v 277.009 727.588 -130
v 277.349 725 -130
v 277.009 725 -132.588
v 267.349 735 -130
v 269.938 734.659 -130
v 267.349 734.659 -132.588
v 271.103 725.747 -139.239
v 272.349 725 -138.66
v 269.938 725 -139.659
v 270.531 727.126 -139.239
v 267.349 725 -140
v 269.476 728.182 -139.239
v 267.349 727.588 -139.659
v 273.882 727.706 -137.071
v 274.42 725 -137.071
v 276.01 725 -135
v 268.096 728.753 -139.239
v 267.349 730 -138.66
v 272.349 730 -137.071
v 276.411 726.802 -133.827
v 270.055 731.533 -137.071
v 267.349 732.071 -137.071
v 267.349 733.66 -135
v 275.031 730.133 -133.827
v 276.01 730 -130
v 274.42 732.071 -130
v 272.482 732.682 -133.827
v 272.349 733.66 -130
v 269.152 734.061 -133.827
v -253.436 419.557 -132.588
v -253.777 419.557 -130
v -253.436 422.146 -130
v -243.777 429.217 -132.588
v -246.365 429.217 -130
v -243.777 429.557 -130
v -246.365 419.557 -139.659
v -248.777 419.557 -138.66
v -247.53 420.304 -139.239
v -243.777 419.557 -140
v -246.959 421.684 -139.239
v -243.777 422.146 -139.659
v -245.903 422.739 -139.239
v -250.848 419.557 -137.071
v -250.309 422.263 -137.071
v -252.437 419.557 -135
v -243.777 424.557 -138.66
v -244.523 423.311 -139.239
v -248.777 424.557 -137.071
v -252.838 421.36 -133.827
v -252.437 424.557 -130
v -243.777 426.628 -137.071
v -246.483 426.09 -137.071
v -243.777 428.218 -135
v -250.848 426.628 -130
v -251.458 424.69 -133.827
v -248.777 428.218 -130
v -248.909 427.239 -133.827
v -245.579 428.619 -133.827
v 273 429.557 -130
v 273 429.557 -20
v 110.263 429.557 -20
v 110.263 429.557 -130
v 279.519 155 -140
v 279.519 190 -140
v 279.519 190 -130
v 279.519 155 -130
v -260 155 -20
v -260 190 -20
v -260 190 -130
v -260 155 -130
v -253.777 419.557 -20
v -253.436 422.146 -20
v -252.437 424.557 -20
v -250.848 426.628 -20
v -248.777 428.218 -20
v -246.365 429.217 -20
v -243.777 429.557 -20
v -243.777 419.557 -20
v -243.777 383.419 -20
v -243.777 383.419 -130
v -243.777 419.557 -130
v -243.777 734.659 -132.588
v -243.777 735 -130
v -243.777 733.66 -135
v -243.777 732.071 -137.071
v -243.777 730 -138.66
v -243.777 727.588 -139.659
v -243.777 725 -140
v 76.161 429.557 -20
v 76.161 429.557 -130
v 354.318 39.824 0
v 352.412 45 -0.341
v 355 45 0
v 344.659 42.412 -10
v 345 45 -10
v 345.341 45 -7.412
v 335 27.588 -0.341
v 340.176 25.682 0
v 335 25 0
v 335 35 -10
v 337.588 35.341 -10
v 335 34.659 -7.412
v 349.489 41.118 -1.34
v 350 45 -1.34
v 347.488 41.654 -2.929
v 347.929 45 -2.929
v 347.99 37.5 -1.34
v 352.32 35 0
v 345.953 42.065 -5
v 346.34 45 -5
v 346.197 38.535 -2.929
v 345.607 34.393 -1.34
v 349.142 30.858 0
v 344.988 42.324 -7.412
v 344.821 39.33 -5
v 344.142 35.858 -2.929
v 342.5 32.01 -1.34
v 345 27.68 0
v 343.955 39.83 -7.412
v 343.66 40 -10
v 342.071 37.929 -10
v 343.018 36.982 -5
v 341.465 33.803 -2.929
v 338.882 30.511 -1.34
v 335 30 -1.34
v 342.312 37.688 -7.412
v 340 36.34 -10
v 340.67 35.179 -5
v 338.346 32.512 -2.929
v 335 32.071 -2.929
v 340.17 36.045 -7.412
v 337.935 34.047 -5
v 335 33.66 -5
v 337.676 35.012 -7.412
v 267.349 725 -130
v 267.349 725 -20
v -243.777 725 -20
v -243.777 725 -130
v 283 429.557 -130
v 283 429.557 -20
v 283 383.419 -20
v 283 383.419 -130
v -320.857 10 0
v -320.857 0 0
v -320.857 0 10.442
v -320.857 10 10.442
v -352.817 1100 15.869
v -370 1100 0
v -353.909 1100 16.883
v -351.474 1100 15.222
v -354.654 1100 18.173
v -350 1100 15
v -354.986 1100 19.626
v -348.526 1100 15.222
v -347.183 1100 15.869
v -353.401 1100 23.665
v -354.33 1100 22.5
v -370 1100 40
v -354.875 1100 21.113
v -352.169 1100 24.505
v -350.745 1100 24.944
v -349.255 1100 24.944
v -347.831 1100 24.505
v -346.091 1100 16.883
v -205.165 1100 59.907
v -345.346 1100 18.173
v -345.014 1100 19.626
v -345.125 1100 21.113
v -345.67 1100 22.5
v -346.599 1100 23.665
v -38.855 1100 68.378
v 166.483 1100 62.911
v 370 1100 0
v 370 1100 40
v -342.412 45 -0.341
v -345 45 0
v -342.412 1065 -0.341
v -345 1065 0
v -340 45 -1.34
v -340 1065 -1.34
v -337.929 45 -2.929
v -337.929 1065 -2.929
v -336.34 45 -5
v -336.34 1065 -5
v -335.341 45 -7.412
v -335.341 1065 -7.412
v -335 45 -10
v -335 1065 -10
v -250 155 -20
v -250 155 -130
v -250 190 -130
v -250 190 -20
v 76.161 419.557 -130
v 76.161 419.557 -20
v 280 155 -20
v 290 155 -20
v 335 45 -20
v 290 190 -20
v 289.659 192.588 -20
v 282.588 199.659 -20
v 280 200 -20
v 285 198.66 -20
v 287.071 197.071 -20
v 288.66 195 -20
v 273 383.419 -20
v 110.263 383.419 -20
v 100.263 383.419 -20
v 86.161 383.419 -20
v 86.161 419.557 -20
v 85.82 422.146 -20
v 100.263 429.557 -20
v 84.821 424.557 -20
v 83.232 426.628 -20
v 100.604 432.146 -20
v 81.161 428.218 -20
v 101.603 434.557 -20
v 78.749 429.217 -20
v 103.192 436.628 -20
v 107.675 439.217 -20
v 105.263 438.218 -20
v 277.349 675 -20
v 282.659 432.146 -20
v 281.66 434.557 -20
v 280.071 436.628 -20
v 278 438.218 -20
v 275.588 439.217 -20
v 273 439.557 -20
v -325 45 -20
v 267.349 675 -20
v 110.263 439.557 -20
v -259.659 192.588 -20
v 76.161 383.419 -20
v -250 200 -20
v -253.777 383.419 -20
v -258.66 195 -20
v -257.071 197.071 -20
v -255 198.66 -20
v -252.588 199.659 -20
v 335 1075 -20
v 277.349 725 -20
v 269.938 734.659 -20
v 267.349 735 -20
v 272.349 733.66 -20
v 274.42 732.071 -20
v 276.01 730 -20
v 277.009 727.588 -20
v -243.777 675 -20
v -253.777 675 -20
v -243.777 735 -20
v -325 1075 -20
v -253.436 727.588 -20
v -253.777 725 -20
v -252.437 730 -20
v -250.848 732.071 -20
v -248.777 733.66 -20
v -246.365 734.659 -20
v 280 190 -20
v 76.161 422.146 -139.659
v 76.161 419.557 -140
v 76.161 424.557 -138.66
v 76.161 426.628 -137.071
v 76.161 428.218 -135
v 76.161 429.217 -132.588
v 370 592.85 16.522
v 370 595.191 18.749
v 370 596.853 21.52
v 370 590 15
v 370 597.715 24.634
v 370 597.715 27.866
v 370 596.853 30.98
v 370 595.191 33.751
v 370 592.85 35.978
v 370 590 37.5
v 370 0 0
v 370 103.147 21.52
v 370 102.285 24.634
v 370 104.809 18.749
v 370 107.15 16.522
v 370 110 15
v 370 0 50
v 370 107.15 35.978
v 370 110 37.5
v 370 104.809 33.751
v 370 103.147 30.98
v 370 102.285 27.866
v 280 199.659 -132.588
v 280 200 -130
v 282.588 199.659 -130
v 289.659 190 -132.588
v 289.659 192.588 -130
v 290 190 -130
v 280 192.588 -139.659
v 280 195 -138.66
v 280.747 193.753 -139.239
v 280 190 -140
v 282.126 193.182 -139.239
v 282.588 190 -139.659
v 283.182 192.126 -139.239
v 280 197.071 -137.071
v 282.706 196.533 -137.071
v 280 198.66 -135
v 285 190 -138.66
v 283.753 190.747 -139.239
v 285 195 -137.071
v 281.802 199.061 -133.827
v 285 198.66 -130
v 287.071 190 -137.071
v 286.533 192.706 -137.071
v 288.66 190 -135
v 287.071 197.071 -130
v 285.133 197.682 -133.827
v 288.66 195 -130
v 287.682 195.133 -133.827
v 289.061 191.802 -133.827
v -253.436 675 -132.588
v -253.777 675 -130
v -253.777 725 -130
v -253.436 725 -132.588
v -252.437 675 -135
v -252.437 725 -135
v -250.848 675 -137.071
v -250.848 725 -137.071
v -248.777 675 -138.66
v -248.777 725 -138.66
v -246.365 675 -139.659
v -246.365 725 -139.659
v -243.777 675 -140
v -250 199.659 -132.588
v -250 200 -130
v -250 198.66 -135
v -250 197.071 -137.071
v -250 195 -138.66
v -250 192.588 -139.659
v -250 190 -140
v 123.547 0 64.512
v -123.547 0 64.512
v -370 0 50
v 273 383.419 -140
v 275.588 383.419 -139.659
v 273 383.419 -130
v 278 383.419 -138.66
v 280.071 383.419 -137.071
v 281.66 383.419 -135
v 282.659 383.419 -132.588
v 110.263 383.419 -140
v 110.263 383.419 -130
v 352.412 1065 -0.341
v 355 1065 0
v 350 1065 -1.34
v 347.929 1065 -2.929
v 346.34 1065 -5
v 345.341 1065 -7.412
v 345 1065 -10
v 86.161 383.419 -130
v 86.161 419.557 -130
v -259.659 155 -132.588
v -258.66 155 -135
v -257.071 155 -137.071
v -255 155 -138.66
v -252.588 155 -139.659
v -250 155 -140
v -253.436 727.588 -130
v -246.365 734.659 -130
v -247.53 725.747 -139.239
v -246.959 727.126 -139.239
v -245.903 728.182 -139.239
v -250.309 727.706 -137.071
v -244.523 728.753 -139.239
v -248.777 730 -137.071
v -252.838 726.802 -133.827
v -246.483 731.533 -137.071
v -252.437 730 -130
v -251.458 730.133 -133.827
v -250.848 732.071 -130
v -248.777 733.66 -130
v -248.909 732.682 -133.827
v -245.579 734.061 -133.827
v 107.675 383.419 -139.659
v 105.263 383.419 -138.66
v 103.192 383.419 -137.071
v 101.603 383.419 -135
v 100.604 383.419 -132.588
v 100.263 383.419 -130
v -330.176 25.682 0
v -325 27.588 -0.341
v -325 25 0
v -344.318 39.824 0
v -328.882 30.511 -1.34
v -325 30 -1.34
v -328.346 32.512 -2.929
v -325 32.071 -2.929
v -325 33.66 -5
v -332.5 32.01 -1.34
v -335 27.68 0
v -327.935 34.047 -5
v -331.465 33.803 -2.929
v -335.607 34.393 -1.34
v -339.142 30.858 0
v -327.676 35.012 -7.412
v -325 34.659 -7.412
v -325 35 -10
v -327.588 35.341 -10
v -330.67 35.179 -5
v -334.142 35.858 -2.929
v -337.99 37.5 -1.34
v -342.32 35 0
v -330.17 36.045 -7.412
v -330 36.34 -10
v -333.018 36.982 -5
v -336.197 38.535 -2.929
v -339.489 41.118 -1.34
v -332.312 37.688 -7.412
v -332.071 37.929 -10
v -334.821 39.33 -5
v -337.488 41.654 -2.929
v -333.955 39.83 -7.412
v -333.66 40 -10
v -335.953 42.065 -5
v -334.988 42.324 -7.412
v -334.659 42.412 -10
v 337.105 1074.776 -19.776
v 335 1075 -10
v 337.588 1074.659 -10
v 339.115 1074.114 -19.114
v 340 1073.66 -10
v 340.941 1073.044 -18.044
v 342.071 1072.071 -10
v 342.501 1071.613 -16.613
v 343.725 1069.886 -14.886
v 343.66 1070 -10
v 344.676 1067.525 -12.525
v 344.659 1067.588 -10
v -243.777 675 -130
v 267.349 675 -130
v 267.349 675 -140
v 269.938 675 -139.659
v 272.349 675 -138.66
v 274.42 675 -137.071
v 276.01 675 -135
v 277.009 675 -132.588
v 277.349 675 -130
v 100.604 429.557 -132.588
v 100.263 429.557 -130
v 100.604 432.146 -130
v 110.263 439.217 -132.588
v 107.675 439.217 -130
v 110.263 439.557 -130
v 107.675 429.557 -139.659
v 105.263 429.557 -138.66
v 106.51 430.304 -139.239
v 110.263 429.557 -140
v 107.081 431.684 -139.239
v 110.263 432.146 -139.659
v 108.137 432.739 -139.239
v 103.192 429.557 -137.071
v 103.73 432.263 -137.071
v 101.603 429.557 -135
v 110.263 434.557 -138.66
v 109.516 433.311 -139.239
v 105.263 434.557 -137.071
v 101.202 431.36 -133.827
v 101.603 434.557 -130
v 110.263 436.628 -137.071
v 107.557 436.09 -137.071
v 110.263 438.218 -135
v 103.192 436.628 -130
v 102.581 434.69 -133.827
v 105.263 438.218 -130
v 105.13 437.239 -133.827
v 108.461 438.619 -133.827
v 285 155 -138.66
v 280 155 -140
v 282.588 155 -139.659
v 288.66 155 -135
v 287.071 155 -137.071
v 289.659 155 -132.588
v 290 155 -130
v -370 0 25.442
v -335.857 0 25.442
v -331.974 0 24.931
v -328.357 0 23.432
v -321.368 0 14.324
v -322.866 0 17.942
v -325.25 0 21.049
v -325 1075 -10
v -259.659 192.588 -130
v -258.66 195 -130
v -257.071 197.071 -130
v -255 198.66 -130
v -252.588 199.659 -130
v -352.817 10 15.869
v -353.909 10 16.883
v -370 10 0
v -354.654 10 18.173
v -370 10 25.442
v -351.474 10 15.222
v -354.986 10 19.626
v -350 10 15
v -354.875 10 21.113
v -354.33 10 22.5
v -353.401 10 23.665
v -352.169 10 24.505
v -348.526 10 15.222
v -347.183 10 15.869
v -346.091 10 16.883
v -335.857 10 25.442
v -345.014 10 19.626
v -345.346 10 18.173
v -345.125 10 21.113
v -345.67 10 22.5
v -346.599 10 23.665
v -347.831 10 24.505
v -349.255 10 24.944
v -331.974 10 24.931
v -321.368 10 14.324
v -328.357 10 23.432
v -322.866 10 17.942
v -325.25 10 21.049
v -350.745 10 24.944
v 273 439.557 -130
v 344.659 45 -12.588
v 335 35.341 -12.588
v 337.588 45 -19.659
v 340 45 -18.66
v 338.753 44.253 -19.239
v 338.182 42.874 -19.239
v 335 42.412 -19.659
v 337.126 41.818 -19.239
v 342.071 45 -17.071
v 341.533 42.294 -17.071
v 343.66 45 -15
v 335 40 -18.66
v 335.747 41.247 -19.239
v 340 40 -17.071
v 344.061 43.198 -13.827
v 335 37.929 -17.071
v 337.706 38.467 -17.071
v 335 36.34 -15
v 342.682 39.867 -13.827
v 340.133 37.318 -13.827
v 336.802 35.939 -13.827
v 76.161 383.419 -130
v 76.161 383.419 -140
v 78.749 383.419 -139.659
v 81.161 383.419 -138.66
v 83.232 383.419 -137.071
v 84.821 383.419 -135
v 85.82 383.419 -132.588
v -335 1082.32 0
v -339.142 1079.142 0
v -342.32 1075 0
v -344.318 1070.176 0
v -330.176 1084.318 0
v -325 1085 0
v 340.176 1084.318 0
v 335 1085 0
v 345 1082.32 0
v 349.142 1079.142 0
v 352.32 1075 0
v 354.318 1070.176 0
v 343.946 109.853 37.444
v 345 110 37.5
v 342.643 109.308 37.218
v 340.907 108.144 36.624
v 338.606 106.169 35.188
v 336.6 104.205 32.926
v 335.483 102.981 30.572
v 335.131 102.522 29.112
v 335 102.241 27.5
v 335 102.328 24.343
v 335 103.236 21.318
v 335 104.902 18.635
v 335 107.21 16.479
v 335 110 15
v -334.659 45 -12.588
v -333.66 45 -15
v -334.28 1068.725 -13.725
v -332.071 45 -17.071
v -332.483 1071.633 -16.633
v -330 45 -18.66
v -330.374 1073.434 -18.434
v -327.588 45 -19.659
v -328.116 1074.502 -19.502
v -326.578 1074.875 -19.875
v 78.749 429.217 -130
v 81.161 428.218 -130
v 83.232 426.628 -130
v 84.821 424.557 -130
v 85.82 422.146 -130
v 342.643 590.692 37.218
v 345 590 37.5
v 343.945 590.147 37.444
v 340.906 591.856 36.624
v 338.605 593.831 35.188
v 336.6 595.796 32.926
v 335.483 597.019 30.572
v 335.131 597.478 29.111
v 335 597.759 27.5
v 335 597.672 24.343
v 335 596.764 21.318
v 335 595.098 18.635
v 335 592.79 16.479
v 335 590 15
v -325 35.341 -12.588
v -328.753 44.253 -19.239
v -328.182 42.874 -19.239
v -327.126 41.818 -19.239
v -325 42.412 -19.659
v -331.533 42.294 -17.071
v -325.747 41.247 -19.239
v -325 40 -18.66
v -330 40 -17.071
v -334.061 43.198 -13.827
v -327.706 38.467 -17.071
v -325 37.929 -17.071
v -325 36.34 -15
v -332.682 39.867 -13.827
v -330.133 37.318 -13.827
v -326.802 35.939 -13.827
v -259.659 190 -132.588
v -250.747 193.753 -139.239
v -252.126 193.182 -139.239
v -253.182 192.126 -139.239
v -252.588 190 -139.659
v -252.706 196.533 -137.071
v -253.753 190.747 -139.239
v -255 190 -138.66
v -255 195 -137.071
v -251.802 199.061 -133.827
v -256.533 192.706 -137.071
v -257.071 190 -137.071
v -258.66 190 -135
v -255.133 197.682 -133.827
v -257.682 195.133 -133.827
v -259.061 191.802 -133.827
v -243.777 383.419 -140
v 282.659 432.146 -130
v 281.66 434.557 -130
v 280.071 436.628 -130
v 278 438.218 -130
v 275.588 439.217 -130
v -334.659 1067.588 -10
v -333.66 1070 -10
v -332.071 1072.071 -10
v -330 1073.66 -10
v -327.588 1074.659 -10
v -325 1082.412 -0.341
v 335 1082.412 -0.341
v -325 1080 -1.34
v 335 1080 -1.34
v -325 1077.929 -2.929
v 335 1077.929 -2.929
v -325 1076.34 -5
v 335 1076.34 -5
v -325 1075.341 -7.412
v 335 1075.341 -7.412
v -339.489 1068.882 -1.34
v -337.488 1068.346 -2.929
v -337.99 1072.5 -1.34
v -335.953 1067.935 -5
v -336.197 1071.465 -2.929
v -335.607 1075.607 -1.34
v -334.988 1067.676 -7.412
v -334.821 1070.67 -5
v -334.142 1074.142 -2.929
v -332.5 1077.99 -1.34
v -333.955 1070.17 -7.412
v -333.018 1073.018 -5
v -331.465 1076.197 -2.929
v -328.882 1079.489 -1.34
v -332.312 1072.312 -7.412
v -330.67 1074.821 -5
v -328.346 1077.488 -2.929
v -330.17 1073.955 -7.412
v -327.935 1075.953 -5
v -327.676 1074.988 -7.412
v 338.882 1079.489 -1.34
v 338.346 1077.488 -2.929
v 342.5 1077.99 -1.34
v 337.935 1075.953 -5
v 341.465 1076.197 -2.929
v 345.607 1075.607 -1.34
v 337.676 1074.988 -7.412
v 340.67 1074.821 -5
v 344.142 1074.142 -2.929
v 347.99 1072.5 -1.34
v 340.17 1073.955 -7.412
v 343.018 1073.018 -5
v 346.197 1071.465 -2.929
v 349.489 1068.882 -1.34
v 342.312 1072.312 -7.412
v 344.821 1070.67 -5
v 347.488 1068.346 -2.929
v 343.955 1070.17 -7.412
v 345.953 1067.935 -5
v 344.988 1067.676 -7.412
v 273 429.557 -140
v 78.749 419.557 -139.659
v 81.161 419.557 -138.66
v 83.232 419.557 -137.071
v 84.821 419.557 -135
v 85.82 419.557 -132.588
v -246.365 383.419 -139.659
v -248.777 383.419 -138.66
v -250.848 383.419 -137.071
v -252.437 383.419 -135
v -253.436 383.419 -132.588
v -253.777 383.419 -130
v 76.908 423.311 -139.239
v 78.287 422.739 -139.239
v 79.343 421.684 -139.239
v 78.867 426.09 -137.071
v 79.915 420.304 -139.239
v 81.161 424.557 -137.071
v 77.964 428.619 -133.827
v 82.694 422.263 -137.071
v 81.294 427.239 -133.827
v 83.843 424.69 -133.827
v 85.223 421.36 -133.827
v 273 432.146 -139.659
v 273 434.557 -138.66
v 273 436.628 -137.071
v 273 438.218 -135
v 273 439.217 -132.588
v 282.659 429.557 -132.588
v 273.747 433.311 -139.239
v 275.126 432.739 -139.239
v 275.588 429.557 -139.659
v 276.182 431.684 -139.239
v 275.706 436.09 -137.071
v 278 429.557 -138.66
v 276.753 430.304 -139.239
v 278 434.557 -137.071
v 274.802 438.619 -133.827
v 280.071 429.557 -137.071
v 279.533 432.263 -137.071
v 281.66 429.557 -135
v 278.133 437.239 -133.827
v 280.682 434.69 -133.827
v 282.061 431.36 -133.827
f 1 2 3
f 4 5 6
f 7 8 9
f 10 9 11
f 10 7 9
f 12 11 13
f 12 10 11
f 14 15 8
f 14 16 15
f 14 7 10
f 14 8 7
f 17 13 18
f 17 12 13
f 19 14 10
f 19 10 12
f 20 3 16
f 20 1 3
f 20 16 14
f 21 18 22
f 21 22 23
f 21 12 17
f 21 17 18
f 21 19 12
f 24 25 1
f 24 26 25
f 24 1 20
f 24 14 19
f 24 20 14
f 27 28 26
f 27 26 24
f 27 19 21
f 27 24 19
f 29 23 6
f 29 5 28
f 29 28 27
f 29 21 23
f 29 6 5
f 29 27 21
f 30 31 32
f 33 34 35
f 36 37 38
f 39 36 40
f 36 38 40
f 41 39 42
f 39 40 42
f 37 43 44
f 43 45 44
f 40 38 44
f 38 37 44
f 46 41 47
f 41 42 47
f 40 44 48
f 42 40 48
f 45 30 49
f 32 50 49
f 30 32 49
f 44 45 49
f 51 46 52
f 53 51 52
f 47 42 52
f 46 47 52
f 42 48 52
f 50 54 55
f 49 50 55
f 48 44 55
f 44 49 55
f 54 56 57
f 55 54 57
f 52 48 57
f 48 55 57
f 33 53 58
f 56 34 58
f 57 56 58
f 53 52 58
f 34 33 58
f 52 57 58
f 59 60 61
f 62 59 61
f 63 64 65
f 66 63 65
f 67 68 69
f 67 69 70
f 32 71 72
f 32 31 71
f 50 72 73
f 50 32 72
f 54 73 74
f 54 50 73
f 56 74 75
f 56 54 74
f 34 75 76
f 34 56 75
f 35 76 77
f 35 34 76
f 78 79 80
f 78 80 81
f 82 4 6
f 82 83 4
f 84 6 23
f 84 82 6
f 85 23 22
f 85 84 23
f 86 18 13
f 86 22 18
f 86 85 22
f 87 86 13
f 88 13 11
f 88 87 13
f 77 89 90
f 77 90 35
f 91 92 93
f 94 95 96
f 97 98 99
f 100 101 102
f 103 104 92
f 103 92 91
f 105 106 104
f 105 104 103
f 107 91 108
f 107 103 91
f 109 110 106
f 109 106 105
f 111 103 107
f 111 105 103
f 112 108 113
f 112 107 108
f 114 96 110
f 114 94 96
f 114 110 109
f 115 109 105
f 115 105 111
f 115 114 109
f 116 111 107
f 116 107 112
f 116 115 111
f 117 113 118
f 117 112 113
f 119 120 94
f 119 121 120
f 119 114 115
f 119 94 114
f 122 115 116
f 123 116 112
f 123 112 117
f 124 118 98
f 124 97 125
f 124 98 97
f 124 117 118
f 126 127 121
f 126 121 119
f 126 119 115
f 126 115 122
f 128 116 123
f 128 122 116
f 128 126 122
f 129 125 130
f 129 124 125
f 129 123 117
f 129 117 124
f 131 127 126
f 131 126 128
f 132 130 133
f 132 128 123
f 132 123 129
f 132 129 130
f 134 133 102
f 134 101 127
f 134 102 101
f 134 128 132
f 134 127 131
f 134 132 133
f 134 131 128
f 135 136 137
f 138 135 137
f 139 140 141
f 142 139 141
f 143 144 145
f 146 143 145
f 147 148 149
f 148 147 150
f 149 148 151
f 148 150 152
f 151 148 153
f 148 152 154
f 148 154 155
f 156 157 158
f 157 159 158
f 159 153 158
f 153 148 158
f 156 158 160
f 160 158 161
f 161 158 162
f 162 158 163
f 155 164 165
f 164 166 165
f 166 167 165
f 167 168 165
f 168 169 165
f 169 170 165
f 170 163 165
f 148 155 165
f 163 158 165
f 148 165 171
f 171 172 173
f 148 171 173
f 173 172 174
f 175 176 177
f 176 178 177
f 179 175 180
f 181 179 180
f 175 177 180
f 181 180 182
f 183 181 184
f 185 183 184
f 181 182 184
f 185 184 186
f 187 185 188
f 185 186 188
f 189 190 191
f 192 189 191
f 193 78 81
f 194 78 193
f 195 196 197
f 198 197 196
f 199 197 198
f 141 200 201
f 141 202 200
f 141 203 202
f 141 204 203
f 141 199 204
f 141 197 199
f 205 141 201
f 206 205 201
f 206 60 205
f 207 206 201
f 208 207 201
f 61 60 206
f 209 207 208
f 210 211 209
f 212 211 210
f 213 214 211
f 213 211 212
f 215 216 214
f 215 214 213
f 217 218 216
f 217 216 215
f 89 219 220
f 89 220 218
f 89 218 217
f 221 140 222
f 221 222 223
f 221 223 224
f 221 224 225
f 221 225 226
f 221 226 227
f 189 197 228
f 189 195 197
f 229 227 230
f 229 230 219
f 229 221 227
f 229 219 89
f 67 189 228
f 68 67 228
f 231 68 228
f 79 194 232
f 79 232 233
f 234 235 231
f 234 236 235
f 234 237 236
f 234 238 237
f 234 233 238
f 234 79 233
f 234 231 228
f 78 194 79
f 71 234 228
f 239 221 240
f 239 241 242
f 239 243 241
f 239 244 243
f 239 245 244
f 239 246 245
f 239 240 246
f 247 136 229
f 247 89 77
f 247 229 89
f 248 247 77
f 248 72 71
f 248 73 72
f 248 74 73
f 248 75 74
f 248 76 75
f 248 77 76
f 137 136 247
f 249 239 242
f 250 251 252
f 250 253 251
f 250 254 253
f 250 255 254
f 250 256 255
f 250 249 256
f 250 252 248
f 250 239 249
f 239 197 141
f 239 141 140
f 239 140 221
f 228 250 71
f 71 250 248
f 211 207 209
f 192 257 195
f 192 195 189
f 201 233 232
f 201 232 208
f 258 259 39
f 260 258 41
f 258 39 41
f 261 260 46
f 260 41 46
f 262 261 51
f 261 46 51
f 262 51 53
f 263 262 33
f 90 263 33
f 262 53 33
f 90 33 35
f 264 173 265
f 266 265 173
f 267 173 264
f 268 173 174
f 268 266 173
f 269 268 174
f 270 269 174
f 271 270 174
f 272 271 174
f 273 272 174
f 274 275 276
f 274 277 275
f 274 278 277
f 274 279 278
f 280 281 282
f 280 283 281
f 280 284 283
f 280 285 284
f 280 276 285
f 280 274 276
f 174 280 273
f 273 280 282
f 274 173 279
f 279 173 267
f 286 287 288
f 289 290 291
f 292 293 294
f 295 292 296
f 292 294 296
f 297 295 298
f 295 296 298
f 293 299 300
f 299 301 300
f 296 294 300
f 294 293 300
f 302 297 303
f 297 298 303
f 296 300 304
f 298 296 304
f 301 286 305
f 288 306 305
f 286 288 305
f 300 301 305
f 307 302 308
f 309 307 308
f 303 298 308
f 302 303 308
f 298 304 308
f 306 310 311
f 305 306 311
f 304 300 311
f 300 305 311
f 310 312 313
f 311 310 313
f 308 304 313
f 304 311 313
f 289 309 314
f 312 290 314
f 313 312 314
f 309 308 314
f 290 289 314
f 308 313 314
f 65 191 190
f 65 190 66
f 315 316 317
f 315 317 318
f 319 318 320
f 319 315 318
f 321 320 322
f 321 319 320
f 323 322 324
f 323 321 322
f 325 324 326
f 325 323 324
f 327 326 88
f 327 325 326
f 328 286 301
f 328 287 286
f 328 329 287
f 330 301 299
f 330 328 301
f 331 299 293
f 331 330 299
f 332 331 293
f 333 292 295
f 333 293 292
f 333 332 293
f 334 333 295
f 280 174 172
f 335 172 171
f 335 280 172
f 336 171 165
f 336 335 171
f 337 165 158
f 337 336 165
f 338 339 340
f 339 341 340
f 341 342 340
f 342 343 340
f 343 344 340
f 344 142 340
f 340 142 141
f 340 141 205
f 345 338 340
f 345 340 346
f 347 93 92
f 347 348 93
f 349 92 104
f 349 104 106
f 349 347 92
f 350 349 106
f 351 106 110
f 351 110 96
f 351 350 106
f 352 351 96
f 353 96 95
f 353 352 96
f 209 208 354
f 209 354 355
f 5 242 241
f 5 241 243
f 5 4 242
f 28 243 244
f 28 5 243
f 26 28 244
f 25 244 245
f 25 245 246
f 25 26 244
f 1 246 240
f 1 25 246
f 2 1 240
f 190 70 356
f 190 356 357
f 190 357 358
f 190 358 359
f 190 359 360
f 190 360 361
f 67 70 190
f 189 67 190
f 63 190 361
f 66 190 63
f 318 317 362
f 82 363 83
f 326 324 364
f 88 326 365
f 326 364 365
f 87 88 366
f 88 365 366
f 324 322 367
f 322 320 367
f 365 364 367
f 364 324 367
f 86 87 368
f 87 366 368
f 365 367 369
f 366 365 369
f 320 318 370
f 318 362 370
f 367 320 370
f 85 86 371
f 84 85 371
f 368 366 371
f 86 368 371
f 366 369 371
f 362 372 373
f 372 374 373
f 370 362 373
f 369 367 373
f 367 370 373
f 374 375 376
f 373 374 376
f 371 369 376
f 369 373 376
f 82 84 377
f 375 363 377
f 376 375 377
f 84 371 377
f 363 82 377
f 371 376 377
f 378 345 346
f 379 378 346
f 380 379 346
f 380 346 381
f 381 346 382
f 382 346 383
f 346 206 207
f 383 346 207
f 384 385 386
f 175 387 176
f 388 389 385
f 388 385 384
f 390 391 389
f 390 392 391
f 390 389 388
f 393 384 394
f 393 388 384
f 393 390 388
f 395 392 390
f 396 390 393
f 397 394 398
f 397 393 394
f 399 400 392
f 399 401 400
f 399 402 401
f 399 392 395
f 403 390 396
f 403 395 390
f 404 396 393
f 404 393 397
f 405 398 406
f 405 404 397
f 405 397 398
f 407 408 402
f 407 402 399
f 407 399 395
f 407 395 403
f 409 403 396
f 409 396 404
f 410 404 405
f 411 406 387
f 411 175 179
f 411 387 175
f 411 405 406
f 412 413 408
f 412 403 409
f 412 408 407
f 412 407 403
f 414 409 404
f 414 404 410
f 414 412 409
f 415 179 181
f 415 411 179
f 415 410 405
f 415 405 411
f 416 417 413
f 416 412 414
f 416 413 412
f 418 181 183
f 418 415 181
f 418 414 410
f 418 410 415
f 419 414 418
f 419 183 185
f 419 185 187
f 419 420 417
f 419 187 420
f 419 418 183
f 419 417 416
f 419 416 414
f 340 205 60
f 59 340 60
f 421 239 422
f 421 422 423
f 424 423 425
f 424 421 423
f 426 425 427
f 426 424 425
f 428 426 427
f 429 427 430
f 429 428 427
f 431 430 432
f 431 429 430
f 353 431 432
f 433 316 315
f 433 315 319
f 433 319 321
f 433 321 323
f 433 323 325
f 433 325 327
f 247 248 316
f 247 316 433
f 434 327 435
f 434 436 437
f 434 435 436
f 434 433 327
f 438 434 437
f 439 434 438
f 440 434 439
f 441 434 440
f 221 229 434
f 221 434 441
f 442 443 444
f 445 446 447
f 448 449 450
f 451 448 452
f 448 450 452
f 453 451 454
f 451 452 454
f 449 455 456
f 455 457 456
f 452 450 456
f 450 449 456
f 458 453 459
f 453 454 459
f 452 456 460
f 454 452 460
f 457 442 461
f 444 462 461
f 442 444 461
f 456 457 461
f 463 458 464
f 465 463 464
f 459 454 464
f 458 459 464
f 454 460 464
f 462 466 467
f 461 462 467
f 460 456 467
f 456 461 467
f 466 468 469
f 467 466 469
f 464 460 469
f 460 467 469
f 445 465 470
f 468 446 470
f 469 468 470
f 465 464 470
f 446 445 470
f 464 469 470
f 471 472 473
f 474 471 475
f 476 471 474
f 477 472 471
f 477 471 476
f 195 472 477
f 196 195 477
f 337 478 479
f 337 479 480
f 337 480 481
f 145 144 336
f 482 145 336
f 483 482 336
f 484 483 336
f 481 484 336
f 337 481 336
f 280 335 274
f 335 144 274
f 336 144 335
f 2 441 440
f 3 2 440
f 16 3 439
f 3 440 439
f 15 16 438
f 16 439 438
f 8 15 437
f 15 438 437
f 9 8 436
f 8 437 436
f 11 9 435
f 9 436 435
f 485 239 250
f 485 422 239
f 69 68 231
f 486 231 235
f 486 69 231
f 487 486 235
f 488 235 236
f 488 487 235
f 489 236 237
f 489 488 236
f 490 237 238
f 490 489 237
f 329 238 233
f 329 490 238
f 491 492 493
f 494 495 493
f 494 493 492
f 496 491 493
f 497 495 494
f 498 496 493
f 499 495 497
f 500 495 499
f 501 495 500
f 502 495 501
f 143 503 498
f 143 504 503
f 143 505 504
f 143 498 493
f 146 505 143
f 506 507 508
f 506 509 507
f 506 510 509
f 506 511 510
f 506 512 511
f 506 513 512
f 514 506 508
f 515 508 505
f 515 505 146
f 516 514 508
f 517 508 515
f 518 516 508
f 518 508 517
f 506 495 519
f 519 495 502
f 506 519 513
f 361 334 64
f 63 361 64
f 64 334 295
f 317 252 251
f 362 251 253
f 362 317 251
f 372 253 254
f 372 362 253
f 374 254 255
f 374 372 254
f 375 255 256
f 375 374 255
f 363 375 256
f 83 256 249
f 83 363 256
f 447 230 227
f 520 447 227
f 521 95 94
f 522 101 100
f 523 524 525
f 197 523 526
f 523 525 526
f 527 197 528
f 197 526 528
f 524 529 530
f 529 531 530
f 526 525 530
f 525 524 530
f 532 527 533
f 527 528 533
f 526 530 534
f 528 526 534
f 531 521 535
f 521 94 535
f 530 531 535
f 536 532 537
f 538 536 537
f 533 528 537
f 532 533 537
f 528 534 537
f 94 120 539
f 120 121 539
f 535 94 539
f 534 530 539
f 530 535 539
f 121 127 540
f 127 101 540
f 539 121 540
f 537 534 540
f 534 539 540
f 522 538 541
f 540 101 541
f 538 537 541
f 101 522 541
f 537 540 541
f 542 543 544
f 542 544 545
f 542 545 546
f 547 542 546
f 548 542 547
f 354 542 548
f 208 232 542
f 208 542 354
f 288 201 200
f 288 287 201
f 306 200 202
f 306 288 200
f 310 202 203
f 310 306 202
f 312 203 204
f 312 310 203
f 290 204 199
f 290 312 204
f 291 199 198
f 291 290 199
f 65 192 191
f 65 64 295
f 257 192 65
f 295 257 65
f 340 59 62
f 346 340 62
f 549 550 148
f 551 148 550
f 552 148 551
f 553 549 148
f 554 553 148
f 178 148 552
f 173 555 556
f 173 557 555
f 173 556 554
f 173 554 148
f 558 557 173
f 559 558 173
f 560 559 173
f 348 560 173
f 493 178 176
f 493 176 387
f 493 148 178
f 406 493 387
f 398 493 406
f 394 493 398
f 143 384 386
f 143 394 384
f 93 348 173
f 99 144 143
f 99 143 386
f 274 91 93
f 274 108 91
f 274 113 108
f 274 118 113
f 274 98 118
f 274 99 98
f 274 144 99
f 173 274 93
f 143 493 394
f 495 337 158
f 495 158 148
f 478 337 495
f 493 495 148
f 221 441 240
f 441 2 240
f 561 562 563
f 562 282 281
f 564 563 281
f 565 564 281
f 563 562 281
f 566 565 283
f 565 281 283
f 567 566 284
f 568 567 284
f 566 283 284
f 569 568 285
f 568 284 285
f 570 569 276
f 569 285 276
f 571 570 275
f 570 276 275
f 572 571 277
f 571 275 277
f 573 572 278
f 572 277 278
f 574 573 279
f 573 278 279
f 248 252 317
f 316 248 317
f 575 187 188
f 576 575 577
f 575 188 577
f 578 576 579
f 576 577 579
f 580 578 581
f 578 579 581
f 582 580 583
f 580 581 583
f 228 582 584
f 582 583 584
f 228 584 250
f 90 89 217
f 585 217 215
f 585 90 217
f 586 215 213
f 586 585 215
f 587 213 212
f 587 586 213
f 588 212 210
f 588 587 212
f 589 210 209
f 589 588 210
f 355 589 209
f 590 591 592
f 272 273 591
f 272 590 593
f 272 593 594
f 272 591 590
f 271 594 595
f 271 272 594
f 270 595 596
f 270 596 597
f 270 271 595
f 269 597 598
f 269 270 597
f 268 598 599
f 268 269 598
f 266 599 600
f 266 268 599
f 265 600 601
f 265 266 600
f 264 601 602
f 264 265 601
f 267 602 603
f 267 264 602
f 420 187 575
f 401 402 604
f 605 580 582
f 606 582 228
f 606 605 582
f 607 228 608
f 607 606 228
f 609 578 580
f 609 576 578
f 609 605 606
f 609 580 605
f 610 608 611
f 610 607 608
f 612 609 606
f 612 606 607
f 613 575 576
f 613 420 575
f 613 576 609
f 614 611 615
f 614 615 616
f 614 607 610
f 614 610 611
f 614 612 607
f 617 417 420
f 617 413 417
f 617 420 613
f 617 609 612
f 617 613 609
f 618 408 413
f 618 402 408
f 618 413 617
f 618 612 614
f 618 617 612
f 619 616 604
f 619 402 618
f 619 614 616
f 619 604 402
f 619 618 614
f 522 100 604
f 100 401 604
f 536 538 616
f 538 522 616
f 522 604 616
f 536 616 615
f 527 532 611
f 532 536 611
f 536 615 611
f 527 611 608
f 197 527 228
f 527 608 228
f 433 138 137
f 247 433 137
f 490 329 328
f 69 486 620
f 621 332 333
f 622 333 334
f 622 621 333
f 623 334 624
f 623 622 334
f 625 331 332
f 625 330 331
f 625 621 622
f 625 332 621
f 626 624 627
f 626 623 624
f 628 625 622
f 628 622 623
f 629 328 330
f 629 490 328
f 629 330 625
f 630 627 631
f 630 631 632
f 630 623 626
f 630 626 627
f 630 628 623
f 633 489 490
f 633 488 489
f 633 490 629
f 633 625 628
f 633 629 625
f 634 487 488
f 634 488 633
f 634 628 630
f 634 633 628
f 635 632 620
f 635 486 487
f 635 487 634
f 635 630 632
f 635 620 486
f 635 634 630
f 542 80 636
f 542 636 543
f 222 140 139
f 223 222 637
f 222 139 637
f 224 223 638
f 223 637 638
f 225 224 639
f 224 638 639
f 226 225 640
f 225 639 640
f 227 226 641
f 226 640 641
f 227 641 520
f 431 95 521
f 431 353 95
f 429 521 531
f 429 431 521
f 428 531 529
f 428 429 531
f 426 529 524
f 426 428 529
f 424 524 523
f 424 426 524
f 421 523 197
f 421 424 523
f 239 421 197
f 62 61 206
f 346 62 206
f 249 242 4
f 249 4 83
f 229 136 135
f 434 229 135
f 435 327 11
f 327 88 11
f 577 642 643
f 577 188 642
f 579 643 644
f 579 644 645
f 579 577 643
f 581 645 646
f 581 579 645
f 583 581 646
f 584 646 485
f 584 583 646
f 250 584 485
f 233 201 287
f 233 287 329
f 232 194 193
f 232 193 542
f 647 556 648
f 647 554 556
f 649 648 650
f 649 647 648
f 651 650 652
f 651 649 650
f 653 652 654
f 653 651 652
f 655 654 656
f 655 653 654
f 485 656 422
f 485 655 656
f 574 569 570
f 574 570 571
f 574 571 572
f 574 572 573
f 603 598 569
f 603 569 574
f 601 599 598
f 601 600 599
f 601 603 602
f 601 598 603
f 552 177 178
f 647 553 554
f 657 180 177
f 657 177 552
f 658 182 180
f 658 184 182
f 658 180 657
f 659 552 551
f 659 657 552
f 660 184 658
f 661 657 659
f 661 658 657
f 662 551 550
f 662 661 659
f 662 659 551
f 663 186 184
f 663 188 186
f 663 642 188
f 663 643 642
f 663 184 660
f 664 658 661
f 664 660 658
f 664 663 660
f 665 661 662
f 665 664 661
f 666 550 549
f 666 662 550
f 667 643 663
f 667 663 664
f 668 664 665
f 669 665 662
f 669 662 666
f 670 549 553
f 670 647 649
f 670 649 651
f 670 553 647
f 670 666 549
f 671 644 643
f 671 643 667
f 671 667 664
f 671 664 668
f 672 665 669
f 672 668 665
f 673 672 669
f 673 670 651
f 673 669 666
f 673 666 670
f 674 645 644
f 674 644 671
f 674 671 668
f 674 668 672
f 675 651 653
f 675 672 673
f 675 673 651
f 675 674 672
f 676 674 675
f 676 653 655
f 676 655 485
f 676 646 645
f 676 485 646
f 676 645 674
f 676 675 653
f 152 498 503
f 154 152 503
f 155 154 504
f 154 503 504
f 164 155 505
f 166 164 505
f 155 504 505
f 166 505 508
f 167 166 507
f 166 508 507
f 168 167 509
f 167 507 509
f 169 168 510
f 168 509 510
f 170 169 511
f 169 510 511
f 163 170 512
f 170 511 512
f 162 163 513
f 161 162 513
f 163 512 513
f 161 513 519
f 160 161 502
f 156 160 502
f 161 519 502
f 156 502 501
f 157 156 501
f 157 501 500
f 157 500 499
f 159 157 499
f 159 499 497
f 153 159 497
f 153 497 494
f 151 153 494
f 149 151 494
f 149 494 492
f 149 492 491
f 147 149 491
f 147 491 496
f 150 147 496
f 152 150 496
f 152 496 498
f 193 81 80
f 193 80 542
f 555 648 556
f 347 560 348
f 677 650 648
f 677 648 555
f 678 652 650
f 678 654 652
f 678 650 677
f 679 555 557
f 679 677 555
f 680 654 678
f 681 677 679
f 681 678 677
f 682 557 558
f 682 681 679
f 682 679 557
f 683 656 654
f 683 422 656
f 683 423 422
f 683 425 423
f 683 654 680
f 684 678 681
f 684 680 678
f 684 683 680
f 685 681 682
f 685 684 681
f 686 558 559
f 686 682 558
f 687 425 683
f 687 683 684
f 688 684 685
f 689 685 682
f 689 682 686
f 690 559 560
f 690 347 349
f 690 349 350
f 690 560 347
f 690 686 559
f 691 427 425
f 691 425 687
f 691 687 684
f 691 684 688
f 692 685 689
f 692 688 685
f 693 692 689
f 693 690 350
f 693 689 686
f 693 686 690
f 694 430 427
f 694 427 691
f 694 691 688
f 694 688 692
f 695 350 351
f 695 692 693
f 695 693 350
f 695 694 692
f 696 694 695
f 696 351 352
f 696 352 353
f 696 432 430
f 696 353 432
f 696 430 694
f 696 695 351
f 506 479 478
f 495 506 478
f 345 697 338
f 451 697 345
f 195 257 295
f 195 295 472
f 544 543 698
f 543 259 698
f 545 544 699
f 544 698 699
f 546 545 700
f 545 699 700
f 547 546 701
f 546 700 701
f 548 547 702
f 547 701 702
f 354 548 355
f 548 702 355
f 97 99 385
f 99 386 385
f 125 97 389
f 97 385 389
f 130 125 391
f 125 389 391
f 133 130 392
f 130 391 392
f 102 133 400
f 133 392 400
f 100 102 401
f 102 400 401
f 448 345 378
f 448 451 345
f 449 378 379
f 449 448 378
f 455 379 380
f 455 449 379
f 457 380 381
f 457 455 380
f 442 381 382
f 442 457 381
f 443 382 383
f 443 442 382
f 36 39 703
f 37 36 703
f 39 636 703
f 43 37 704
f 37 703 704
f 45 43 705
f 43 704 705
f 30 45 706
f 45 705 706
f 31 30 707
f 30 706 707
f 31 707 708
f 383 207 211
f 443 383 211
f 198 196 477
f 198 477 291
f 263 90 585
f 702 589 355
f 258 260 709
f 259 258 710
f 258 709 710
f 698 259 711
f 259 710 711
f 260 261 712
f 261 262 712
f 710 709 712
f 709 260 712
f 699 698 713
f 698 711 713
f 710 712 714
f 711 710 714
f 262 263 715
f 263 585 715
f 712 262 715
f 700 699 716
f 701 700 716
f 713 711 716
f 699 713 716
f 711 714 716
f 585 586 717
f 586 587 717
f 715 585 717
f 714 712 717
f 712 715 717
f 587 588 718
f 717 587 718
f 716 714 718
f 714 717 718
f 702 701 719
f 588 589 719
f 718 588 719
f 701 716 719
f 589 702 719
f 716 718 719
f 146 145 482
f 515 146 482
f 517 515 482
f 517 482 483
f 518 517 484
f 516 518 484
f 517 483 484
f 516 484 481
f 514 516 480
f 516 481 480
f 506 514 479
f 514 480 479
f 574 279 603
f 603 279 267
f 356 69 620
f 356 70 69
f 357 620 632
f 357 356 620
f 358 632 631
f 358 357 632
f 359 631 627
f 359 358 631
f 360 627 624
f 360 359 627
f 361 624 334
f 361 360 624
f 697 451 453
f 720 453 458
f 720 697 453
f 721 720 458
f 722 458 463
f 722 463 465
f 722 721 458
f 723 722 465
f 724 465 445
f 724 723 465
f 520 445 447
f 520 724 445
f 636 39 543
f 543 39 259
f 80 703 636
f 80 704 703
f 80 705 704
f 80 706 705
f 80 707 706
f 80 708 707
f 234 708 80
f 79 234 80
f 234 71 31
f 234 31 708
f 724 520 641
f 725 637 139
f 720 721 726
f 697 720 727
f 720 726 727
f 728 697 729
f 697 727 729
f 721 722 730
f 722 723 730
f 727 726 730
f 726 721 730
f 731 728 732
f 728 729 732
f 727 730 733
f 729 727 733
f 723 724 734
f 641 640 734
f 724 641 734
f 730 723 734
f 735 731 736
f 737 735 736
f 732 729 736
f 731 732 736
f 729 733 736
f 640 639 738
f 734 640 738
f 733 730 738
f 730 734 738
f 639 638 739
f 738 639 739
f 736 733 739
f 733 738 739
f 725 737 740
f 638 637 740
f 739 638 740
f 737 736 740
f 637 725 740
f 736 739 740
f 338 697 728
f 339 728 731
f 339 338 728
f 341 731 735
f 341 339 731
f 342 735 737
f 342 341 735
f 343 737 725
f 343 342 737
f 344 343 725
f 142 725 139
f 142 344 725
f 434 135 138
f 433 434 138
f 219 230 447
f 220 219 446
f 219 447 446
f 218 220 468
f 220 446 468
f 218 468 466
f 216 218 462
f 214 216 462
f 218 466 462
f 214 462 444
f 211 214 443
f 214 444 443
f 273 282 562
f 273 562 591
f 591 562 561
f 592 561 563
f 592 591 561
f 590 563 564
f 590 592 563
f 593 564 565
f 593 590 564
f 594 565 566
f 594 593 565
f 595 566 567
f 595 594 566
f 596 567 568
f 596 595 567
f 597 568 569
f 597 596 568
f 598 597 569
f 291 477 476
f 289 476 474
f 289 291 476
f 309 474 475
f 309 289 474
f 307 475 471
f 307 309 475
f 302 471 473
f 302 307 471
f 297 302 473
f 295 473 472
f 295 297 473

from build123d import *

# Parameters (mm, degrees)
CORTE_EXTRUS_O3_REACH     = 1164.591
ESBO_O5_R                 = 5
CORTE_EXTRUS_O4_DEPTH     = 10
ESBO_O8_W                 = 680
ESBO_O8_H                 = 1040
RESSALTO_EXTRUS_O1_DEPTH  = 20
FILETE1_R                 = 10
ESBO_O11_W                = 22.5
ESBO_O11_H                = 480
CORTE_EXTRUS_O5_DEPTH     = 35
CORTE_EXTRUS_O6_DEPTH     = 35
FILETE15_R                = 10
RESSALTO_EXTRUS_O2_DEPTH  = 120
FILETE16_R                = 10
RESSALTO_EXTRUS_O4_DEPTH  = 120
ESBO_O16_W                = 319.937855213
ESBO_O16_H                = 10
RESSALTO_EXTRUS_O5_DEPTH  = 36.138
FILETE17_R                = 10
RESSALTO_EXTRUS_O6_DEPTH  = 120
ESBO_O18_W                = 162.736994832
ESBO_O18_H                = 10
RESSALTO_EXTRUS_O7_DEPTH  = 46.138
FILETE18_R                = 10
ESBO_O19_W                = 531.126065259
ESBO_O19_H                = 10
RESSALTO_EXTRUS_O8_DEPTH  = 120
RESSALTO_EXTRUS_O9_DEPTH  = 50
FILETE19_R                = 10
ESBO_O22_W                = 529.518507703
ESBO_O22_H                = 10
RESSALTO_EXTRUS_O10_DEPTH = 35


with BuildPart() as part:
    # Esboço2 for Loft1 → Loft1 section 0
    with BuildSketch(Plane(origin=(0, 1100, 0), x_dir=(1, 0, 0), z_dir=(0, 1, 0))):
        with BuildLine():
            Line((-370, 0), (370, 0))
            Line((370, 0), (370, -40))
            # circular arc as an exact rational Bezier (weights 1, cos(half-angle), 1)
            Bezier((370, -40), (0, -97.731859317), (-370, -40), weights=[1, 0.988044857, 1])
            Line((-370, -40), (-370, 0))
        make_face()
    # Esboço1 for Loft1 → Loft1 section 1
    with BuildSketch(Plane(origin=(0, 0, 0), x_dir=(1, 0, 0), z_dir=(0, 1, 0))):
        with BuildLine():
            Line((-370, 0), (370, 0))
            Line((370, 0), (370, -50))
            Bezier((370, -50), (0, -82.722461177), (-370, -50), weights=[1, 0.996112056, 1])
            Line((-370, -50), (-370, 0))
        make_face()
    loft()

    # Esboço5 → Corte-extrusão3 (cut, up to next)
    with BuildSketch(Plane.XZ, mode=Mode.PRIVATE) as corte_extrus_o3_sk1:
        with Locations(Location((-350, 20, 0), (0, 0, 270))):
            Circle(ESBO_O5_R)
    corte_extrus_o3_tool1 = extrude(corte_extrus_o3_sk1.sketch, amount=-CORTE_EXTRUS_O3_REACH, mode=Mode.PRIVATE) & part.part
    add(corte_extrus_o3_tool1.solids().sort_by_distance((-350, 0, 20))[0], mode=Mode.SUBTRACT)

    # Esboço6 → Corte-extrusão4 (cut)
    with BuildSketch(Plane.XZ):
        with BuildLine():
            Line((-370, 0), (-320.856761827, 0))
            Line((-320.856761827, 0), (-320.856761827, 10.441916975))
            ThreePointArc((-320.856761827, 10.441916975), (-325.250160109, 21.048518693), (-335.856761827, 25.441916975))
            Line((-335.856761827, 25.441916975), (-370, 25.441916975))
            Line((-370, 25.441916975), (-370, 0))
        make_face()
    extrude(amount=-CORTE_EXTRUS_O4_DEPTH, mode=Mode.SUBTRACT)

    # Esboço8 → Ressalto-extrusão1 (add)
    with BuildSketch(Plane(origin=(0, 0, 0), x_dir=(-1, 0, 0), z_dir=(0, 0, -1))):
        with Locations((-5, 555)):
            Rectangle(ESBO_O8_W, ESBO_O8_H)
    extrude(amount=RESSALTO_EXTRUS_O1_DEPTH)

    # Filete1
    filete1_edges = [part.edges().sort_by_distance(p)[0] for p in [
        (-335, 555, 0),
        (-335, 35, -10),
        (5, 1075, 0),
        (-335, 1075, -10),
        (345, 555, 0),
        (345, 1075, -10),
        (5, 35, 0),
        (345, 35, -10),
        (-335, 555, -20),
        (345, 555, -20),
        (5, 35, -20),
    ]]
    fillet(filete1_edges, radius=FILETE1_R - 0.0001)  # a hair under: the kernel refuses the full size

    # Esboço11 → Corte-extrusão5 (cut)
    with BuildSketch(Plane(origin=(370, 0, 0), x_dir=(0, 0, -1), z_dir=(1, 0, 0))):
        with Locations((-26.25, 350)):
            Rectangle(ESBO_O11_W, ESBO_O11_H)
    extrude(amount=-CORTE_EXTRUS_O5_DEPTH, mode=Mode.SUBTRACT)

    # Esboço12 → Corte-extrusão6 (cut)
    with BuildSketch(Plane(origin=(370, 0, 0), x_dir=(0, 0, -1), z_dir=(1, 0, 0))):
        with BuildLine():
            Line((-15, 110), (-37.5, 110))
            ThreePointArc((-37.5, 110), (-26.25, 102.175823272), (-15, 110))
        make_face()
        with BuildLine():
            Line((-15, 590), (-37.5, 590))
            ThreePointArc((-37.5, 590), (-26.25, 597.824176728), (-15, 590))
        make_face()
    extrude(amount=-CORTE_EXTRUS_O6_DEPTH, mode=Mode.SUBTRACT)

    # Filete15
    filete15_edges = [part.edges().sort_by_distance(p)[0] for p in [
        (335, 350, 37.5),
    ]]
    fillet(filete15_edges, radius=FILETE15_R)

    # Esboço13 → Ressalto-extrusão2 (add)
    with BuildSketch(Plane(origin=(0, 0, -20), x_dir=(-1, 0, 0), z_dir=(0, 0, -1))):
        Polygon((260, 155), (250, 155), (250, 190), (-280, 190), (-280, 155), (-290, 155), (-290, 200), (260, 200), align=None)
    extrude(amount=RESSALTO_EXTRUS_O2_DEPTH)

    # Filete16
    filete16_edges = [part.edges().sort_by_distance(p)[0] for p in [
        (290, 200, -80),
        (-260, 200, -80),
        (15, 200, -140),
        (-260, 177.5, -140),
        (290, 177.5, -140),
    ]]
    fillet(filete16_edges, radius=FILETE16_R - 0.0001)  # a hair under: the kernel refuses the full size

    # Esboço15 → Ressalto-extrusão4 (add)
    with BuildSketch(Plane(origin=(0, 0, -20), x_dir=(-1, 0, 0), z_dir=(0, 0, -1))):
        Polygon((253.776635588, 383.41937577), (243.776635588, 383.41937577), (243.776635588, 419.557368326), (-76.161219625, 419.557368326), (-76.161219625, 383.41937577), (-86.161219625, 383.41937577), (-86.161219625, 429.557368326), (253.776635588, 429.557368326), align=None)
    extrude(amount=RESSALTO_EXTRUS_O4_DEPTH)

    # Esboço16 → Ressalto-extrusão5 (add)
    with BuildSketch(Plane.XZ.offset(-419.557368326)):
        with Locations((-83.807707982, -135)):
            Rectangle(ESBO_O16_W, ESBO_O16_H)
    extrude(amount=RESSALTO_EXTRUS_O5_DEPTH)

    # Filete17
    filete17_edges = [part.edges().sort_by_distance(p)[0] for p in [
        (-253.776635588, 429.557368326, -80),
        (86.161219625, 429.557368326, -80),
        (-253.776635588, 406.488372048, -140),
        (-83.807707982, 429.557368326, -140),
        (86.161219625, 406.488372048, -140),
    ]]
    fillet(filete17_edges, radius=FILETE17_R - 0.0001)  # a hair under: the kernel refuses the full size

    # Esboço17 → Ressalto-extrusão6 (add)
    with BuildSketch(Plane(origin=(0, 0, -20), x_dir=(-1, 0, 0), z_dir=(0, 0, -1))):
        Polygon((-100.263005168, 439.557368326), (-283, 439.557368326), (-283, 383.41937577), (-273, 383.41937577), (-273, 429.557368326), (-110.263005168, 429.557368326), (-110.263005168, 383.41937577), (-100.263005168, 383.41937577), align=None)
    extrude(amount=RESSALTO_EXTRUS_O6_DEPTH)

    # Esboço18 → Ressalto-extrusão7 (add)
    with BuildSketch(Plane(origin=(0, 429.557368326, 0), x_dir=(-1, 0, 0), z_dir=(0, -1, 0))):
        with Locations((-191.631502584, 135)):
            Rectangle(ESBO_O18_W, ESBO_O18_H)
    extrude(amount=RESSALTO_EXTRUS_O7_DEPTH)

    # Filete18
    filete18_edges = [part.edges().sort_by_distance(p)[0] for p in [
        (100.263005168, 439.557368326, -80),
        (283, 439.557368326, -80),
        (100.263005168, 411.488372048, -140),
        (191.631502584, 439.557368326, -140),
        (283, 411.488372048, -140),
    ]]
    fillet(filete18_edges, radius=FILETE18_R - 0.0001)  # a hair under: the kernel refuses the full size

    # Esboço19 → Ressalto-extrusão8 (add)
    with BuildSketch(Plane(origin=(0, 0, -20), x_dir=(-1, 0, 0), z_dir=(0, 0, -1))):
        with Locations((-11.786397041, 730)):
            Rectangle(ESBO_O19_W, ESBO_O19_H)
    extrude(amount=RESSALTO_EXTRUS_O8_DEPTH)

    # Esboço20 → Ressalto-extrusão9 (add)
    with BuildSketch(Plane.XZ.offset(-725)):
        Polygon((-253.776635588, -20), (-253.776635588, -140), (277.349429671, -140), (277.349429671, -20), (267.349429671, -20), (267.349429671, -130), (-243.776635588, -130), (-243.776635588, -20), align=None)
    extrude(amount=RESSALTO_EXTRUS_O9_DEPTH)

    # Filete19
    filete19_edges = [part.edges().sort_by_distance(p)[0] for p in [
        (277.349429671, 735, -80),
        (-253.776635588, 735, -80),
        (277.349429671, 705, -140),
        (-253.776635588, 705, -140),
        (11.786397041, 735, -140),
    ]]
    fillet(filete19_edges, radius=FILETE19_R)

    # Esboço22 → Ressalto-extrusão10 (add)
    with BuildSketch(Plane.XZ.offset(-190)):
        with Locations((14.759253851, -135)):
            Rectangle(ESBO_O22_W, ESBO_O22_H)
    extrude(amount=RESSALTO_EXTRUS_O10_DEPTH)


solid = part.part
